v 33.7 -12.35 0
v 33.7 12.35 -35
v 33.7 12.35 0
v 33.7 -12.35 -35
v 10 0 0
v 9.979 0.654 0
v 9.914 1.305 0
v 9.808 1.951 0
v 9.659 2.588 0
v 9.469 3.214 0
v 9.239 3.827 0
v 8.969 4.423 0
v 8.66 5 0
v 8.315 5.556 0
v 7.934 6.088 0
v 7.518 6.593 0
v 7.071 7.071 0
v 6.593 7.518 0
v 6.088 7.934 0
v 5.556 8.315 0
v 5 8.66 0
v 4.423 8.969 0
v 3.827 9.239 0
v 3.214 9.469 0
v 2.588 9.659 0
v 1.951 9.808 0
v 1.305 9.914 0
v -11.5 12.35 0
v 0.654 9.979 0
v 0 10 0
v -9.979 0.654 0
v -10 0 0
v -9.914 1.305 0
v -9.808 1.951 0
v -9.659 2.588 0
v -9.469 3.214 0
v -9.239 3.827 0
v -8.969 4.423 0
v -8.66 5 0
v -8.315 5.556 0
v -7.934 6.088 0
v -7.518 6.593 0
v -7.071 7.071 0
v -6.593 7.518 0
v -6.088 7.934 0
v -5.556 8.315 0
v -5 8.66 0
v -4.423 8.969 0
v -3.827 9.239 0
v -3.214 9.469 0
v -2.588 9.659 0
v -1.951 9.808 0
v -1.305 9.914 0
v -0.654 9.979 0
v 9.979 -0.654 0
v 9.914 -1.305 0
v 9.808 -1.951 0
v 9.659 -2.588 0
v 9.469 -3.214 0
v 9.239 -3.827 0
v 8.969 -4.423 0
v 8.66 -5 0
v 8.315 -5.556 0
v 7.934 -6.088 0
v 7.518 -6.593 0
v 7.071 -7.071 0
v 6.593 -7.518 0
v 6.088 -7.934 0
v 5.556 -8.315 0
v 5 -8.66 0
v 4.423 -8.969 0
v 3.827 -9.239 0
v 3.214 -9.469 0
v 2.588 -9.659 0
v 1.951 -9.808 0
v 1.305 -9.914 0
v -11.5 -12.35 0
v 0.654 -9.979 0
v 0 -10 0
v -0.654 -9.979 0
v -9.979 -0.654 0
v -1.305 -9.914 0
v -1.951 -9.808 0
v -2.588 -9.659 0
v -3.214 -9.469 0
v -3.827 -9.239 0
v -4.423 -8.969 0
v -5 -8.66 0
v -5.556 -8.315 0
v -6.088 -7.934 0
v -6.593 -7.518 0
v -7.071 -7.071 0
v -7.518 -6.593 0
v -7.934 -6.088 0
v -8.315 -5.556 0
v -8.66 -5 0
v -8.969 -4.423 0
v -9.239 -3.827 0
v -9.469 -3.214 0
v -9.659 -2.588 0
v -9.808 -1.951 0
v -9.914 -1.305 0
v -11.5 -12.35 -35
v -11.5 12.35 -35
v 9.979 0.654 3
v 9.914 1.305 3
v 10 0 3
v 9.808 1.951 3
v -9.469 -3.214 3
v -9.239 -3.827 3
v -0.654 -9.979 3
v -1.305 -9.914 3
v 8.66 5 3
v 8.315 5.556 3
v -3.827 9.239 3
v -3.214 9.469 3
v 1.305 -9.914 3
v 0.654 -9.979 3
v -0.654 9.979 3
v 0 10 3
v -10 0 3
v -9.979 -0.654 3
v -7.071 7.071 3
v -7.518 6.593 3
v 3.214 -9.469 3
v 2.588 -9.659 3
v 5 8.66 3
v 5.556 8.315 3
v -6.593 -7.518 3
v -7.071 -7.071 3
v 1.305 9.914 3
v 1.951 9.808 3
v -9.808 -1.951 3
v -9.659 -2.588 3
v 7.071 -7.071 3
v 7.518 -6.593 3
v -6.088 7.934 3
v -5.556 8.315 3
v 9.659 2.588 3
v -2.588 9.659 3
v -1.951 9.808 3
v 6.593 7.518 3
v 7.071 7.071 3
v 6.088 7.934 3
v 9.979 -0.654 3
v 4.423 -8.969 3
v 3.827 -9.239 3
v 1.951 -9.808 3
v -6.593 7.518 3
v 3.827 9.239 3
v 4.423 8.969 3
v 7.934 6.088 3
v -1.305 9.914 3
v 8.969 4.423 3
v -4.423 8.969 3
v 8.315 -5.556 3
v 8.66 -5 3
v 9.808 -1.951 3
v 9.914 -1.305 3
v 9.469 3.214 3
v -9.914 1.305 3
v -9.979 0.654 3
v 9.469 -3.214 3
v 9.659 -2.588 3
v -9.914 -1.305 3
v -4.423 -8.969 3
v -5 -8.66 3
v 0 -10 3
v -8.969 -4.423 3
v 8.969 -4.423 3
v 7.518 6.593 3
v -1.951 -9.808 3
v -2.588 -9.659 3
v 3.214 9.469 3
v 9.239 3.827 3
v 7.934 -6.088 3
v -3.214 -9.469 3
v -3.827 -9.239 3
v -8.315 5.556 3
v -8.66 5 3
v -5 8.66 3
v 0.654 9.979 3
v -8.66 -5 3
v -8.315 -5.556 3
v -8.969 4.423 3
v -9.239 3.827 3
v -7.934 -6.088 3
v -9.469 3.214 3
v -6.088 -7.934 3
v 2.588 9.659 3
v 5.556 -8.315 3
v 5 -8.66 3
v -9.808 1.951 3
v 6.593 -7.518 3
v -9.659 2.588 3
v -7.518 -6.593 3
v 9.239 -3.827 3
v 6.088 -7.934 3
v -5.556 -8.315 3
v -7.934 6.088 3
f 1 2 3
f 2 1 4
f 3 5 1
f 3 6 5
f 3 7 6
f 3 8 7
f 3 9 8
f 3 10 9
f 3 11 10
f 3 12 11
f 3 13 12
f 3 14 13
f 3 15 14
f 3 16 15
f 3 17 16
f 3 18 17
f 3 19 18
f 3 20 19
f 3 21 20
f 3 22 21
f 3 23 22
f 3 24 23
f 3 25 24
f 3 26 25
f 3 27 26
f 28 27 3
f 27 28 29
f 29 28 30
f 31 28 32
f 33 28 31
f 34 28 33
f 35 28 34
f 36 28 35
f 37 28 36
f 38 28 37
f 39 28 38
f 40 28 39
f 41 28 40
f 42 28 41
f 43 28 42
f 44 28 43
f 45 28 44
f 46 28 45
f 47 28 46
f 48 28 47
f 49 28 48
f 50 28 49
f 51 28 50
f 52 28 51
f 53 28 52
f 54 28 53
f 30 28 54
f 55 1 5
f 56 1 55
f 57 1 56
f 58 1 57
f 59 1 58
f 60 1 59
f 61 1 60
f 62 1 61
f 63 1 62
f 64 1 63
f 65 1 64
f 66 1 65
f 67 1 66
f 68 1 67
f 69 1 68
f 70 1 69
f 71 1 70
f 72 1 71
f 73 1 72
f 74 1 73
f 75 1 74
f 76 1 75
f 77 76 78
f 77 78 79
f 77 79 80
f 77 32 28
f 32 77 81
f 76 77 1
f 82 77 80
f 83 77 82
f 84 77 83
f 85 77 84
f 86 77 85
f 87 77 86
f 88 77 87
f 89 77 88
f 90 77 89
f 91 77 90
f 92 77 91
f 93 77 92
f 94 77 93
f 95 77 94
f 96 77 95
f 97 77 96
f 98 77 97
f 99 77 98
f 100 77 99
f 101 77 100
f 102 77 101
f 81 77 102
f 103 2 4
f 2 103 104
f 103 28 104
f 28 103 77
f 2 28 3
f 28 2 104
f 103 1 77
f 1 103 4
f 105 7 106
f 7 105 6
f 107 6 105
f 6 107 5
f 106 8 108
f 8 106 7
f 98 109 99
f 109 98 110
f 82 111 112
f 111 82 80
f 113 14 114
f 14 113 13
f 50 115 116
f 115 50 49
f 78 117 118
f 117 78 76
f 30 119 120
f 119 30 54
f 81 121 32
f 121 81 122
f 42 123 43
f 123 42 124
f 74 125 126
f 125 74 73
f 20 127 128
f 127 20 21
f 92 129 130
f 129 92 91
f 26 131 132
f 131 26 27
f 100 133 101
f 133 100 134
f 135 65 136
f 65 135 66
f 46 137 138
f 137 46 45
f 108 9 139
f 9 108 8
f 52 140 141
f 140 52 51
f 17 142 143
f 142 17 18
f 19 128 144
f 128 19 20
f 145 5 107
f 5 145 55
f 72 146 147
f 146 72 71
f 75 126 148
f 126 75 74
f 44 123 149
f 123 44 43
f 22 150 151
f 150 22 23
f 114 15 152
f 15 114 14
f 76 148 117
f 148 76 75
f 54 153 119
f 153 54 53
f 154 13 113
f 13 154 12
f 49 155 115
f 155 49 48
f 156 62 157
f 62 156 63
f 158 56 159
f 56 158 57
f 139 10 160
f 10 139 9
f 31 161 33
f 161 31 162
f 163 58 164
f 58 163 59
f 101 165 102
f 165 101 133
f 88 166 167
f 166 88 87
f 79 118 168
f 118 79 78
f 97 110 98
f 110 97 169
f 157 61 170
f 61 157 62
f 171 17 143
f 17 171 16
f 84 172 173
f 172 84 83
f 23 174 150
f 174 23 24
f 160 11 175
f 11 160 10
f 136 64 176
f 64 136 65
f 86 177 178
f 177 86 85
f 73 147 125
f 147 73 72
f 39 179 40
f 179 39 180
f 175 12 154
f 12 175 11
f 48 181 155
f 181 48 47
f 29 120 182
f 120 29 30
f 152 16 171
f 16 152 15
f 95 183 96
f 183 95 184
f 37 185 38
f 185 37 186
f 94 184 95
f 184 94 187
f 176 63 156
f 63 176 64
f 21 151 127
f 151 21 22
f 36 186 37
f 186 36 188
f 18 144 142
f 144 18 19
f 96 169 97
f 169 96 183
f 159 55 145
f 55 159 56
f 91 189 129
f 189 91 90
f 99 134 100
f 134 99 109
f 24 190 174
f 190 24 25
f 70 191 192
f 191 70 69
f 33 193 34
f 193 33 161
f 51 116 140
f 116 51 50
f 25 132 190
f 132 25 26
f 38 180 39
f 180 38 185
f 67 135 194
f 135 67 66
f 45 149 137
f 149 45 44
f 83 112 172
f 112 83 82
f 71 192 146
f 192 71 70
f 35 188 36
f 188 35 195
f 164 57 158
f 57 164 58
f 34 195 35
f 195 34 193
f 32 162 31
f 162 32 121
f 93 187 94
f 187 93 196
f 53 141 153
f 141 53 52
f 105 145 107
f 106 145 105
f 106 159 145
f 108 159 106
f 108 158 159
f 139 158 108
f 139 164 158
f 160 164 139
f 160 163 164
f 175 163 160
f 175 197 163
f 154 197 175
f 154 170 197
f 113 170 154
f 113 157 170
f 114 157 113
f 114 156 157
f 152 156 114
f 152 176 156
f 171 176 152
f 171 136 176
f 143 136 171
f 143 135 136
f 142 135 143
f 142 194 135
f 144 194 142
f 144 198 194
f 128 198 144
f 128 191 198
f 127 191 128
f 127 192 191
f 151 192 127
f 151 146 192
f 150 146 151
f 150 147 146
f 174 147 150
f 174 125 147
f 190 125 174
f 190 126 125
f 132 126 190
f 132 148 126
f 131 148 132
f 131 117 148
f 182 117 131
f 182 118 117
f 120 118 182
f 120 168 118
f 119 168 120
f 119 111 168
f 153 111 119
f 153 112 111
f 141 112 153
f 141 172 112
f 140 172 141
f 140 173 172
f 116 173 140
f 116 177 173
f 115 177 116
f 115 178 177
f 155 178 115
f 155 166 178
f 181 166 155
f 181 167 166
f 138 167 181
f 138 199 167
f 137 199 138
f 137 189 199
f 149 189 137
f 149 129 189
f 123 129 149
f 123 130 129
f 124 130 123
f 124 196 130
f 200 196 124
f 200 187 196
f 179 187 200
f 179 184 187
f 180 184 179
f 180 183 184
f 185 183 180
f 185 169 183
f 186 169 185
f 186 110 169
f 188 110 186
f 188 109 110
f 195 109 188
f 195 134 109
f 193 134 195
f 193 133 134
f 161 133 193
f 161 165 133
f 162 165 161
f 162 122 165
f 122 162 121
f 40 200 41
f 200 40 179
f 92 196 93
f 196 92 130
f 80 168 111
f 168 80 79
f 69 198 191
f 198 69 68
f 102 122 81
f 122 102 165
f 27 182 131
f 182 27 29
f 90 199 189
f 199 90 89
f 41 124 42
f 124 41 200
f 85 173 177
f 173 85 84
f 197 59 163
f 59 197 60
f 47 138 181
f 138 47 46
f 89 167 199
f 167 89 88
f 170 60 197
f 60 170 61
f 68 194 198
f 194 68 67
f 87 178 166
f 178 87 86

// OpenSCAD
// file: ../params.scad
// Piper-Watch - all dimensions in one place (millimetres).
// Values marked EST are estimates; correct them after measuring the real part.

$fn = 96;                        // circle smoothness for previews/exports

// --- Printing: Bambu Lab A1, 0.4 mm nozzle, PETG -------------------------------
line_w      = 0.45;              // extrusion width
wall        = 4 * line_w;        // 1.8 mm: minimum for load-bearing walls
bed         = [225, 225, 225];   // build volume
clr_hole    = 0.25;              // added to bolt hole diameters (tune with the tolerance coupon)
clr_fit     = 0.30;              // gap for parts that slide/rotate against each other

// --- Fasteners ------------------------------------------------------------------
m3          = 3.0;
m4          = 4.0;
insert_m3   = [4.1, 5.0];        // heat-set insert bore [diameter, depth]
insert_m4   = [5.6, 6.0];

// --- Lazy Susan: 140 mm round aluminium turntable bearing (Amazon B08CSMCRC6) ----
ls_od        = 140;              // outer diameter (given)
ls_id        = 85;               // centre opening (given)
ls_h         = 10.5;             // total thickness, both rings (measured on listing photo)
ls_split_d   = 113;              // EST: diameter where outer and inner ring meet
ls_hole_d    = 4.5;              // EST: through holes, countersunk (M4 / #8)
ls_outer_bc  = 128;              // EST: outer ring bolt circle diameter, 4 holes
ls_inner_bc  = 100;              // EST: inner ring bolt circle diameter, 4 holes
ls_holes     = 4;
ls_inner_rot = 45;               // inner holes sit between the outer ones

// --- Feetech STS3215 (12 V / 30 kg.cm) - EST from datasheet, verify on arrival --
sts_body     = [45.2, 24.7, 35]; // length x width x height (without horn)
sts_shaft_x  = 11.5;             // EST: output shaft centre from the near end
sts_horn_d   = 20;               // EST: horn diameter
sts_horn_h   = 3;

// --- Logitech C920X core module - EST ----------------------------------------------
cam_core     = [90, 30, 25];

// --- E32R40T 4" display board - TODO: measure outline, holes, connector positions --
lcd_board    = [110, 70, 12];    // EST placeholder
// main file
// Feetech STS3215 serial bus servo - simple visual model (not printed).
// Origin = centre of the output shaft at the top face of the body; shaft points +Z.
// Dimensions are estimates - check against the real servo before designing brackets.
include <../params.scad>

module sts3215(horn = true) {
    color("dimgray")
        translate([-sts_shaft_x, -sts_body[1] / 2, -sts_body[2]])
            cube(sts_body);
    if (horn)
        color("lightgray") cylinder(d = sts_horn_d, h = sts_horn_h);
}

sts3215();
